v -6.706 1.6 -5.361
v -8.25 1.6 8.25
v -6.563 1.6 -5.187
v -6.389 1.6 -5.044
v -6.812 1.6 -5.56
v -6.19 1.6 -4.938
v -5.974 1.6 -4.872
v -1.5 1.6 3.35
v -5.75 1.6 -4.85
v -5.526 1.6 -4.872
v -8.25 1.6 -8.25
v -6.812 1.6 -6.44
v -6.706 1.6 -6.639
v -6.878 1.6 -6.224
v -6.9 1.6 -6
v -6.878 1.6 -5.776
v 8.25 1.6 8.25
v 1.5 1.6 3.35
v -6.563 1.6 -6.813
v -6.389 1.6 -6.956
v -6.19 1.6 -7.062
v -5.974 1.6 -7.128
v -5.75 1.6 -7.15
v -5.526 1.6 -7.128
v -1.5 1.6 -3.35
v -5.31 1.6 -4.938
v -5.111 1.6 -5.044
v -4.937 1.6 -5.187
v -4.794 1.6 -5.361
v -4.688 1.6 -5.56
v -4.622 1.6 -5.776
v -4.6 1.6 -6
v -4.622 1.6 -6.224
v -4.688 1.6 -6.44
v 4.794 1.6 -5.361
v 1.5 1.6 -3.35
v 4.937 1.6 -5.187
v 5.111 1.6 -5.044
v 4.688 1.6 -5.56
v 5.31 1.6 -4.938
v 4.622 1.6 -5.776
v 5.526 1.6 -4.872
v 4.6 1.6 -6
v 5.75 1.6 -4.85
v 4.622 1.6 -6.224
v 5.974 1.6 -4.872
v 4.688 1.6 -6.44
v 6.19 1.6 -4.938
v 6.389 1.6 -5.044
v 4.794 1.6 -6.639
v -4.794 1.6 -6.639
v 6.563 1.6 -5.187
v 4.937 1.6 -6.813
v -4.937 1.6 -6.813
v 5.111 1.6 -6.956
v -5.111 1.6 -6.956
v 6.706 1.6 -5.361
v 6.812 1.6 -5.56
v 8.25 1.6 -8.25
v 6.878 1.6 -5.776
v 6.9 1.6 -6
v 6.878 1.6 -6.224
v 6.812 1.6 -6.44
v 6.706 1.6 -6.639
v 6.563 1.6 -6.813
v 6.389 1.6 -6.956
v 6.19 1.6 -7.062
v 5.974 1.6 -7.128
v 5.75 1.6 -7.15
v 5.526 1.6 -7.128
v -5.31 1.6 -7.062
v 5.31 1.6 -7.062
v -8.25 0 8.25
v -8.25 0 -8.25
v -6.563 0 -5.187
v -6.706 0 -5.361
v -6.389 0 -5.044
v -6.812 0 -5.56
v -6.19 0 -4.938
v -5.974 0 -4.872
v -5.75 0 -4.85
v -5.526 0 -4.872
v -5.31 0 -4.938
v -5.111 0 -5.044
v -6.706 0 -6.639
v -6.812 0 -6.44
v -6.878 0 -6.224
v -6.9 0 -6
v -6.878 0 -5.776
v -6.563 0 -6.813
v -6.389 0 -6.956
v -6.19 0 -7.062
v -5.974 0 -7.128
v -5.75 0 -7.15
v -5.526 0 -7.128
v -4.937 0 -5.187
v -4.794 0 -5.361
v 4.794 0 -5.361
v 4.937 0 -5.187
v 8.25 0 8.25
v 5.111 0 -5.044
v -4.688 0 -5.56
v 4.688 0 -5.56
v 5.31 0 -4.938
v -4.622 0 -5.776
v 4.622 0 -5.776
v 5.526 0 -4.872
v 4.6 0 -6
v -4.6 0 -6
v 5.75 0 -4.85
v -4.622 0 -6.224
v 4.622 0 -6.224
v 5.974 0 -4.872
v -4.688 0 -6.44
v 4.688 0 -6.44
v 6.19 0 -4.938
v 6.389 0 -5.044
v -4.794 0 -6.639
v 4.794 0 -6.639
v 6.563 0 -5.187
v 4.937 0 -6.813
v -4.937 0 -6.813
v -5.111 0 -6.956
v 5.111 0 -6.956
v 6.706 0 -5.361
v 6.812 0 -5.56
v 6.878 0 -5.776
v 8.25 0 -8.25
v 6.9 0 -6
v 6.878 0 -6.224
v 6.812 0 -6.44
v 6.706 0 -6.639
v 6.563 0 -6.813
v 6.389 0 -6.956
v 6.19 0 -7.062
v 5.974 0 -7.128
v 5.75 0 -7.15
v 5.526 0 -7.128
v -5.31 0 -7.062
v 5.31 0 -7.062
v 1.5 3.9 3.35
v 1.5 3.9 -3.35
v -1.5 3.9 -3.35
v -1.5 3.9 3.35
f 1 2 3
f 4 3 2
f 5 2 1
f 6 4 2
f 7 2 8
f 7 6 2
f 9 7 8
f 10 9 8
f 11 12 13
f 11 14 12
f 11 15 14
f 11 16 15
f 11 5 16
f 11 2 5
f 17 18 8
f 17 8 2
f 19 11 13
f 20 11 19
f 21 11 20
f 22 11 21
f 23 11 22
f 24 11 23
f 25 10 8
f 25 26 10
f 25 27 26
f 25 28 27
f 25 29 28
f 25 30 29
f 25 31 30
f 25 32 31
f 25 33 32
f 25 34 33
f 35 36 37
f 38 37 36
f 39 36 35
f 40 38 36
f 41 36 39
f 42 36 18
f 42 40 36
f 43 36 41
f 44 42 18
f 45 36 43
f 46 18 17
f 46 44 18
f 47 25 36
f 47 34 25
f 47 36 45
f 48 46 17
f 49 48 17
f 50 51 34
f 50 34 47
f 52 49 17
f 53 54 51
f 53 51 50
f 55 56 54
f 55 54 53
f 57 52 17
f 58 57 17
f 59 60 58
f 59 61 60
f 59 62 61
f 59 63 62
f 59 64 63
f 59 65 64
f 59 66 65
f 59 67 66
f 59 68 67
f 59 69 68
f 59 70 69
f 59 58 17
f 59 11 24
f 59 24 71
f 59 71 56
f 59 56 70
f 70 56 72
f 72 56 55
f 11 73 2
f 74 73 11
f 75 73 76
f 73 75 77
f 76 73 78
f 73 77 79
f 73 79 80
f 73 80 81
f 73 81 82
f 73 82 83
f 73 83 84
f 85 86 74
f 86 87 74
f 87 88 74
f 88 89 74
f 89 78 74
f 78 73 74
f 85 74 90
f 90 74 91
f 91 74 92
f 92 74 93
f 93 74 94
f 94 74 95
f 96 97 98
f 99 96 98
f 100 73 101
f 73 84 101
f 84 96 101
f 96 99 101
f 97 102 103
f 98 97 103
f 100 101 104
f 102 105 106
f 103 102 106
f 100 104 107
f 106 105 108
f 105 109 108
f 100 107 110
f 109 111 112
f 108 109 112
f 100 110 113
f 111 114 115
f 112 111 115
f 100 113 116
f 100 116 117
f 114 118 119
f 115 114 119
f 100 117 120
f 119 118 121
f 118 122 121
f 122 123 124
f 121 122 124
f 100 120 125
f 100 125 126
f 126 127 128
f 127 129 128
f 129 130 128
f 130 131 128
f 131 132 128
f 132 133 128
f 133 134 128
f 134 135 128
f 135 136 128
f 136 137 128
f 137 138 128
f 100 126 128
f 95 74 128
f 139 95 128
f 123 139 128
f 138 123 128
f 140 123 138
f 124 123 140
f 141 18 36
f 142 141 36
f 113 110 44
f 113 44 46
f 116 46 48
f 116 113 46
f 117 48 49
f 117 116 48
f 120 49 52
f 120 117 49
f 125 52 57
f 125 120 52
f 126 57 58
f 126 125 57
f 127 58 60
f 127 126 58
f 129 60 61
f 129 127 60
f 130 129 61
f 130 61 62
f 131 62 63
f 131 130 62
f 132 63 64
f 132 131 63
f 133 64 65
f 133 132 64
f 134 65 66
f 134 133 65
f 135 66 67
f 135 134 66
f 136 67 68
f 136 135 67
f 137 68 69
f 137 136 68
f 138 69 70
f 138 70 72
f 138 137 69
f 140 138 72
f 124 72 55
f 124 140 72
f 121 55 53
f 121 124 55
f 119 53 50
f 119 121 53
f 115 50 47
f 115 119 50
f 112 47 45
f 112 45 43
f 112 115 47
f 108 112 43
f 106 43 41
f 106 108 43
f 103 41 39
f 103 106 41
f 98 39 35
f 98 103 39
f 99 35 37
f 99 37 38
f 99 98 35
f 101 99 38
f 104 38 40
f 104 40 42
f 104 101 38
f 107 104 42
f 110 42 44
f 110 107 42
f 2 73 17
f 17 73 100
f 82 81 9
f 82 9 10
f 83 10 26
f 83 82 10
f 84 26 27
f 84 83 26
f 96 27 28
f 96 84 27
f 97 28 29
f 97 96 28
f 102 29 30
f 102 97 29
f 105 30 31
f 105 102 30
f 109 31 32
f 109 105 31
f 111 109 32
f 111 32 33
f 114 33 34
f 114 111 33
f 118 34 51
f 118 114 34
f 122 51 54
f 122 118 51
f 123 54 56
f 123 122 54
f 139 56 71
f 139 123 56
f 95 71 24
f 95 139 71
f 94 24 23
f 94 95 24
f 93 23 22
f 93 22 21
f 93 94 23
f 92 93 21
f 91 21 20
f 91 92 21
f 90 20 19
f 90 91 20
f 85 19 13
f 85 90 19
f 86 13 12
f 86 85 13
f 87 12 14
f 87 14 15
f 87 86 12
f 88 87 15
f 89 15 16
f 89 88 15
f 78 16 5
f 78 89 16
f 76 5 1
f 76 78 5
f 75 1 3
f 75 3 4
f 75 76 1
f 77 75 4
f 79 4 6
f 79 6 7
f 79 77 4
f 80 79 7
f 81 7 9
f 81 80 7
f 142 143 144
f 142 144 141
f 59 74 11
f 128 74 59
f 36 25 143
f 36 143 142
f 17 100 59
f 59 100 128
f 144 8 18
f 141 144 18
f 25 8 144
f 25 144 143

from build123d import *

# Parameters (mm, degrees)
SKETCH1_W           = 16.5
SKETCH1_H           = 16.5
SKETCH1_R           = 1.15
BOSS_EXTRUDE1_DEPTH = 1.6
SKETCH2_W           = 3
SKETCH2_H           = 6.7
BOSS_EXTRUDE2_DEPTH = 2.3


with BuildPart() as part:
    # Sketch1 → Boss-Extrude1 (new body)
    with BuildSketch(Plane(origin=(0, 0, 0), x_dir=(1, 0, 0), z_dir=(0, 1, 0))):
        Rectangle(SKETCH1_W, SKETCH1_H)
        with Locations(Location((-5.75, 6, 0), (0, 0, 270))):
            Circle(SKETCH1_R, mode=Mode.SUBTRACT)
        with Locations(Location((5.75, 6, 0), (0, 0, 270))):
            Circle(SKETCH1_R, mode=Mode.SUBTRACT)
    extrude(amount=BOSS_EXTRUDE1_DEPTH)

    # Sketch2 → Boss-Extrude2 (add)
    with BuildSketch(Plane(origin=(0, 1.6, 0), x_dir=(1, 0, 0), z_dir=(0, 1, 0))):
        Rectangle(SKETCH2_W, SKETCH2_H)
    extrude(amount=BOSS_EXTRUDE2_DEPTH)


solid = part.part
